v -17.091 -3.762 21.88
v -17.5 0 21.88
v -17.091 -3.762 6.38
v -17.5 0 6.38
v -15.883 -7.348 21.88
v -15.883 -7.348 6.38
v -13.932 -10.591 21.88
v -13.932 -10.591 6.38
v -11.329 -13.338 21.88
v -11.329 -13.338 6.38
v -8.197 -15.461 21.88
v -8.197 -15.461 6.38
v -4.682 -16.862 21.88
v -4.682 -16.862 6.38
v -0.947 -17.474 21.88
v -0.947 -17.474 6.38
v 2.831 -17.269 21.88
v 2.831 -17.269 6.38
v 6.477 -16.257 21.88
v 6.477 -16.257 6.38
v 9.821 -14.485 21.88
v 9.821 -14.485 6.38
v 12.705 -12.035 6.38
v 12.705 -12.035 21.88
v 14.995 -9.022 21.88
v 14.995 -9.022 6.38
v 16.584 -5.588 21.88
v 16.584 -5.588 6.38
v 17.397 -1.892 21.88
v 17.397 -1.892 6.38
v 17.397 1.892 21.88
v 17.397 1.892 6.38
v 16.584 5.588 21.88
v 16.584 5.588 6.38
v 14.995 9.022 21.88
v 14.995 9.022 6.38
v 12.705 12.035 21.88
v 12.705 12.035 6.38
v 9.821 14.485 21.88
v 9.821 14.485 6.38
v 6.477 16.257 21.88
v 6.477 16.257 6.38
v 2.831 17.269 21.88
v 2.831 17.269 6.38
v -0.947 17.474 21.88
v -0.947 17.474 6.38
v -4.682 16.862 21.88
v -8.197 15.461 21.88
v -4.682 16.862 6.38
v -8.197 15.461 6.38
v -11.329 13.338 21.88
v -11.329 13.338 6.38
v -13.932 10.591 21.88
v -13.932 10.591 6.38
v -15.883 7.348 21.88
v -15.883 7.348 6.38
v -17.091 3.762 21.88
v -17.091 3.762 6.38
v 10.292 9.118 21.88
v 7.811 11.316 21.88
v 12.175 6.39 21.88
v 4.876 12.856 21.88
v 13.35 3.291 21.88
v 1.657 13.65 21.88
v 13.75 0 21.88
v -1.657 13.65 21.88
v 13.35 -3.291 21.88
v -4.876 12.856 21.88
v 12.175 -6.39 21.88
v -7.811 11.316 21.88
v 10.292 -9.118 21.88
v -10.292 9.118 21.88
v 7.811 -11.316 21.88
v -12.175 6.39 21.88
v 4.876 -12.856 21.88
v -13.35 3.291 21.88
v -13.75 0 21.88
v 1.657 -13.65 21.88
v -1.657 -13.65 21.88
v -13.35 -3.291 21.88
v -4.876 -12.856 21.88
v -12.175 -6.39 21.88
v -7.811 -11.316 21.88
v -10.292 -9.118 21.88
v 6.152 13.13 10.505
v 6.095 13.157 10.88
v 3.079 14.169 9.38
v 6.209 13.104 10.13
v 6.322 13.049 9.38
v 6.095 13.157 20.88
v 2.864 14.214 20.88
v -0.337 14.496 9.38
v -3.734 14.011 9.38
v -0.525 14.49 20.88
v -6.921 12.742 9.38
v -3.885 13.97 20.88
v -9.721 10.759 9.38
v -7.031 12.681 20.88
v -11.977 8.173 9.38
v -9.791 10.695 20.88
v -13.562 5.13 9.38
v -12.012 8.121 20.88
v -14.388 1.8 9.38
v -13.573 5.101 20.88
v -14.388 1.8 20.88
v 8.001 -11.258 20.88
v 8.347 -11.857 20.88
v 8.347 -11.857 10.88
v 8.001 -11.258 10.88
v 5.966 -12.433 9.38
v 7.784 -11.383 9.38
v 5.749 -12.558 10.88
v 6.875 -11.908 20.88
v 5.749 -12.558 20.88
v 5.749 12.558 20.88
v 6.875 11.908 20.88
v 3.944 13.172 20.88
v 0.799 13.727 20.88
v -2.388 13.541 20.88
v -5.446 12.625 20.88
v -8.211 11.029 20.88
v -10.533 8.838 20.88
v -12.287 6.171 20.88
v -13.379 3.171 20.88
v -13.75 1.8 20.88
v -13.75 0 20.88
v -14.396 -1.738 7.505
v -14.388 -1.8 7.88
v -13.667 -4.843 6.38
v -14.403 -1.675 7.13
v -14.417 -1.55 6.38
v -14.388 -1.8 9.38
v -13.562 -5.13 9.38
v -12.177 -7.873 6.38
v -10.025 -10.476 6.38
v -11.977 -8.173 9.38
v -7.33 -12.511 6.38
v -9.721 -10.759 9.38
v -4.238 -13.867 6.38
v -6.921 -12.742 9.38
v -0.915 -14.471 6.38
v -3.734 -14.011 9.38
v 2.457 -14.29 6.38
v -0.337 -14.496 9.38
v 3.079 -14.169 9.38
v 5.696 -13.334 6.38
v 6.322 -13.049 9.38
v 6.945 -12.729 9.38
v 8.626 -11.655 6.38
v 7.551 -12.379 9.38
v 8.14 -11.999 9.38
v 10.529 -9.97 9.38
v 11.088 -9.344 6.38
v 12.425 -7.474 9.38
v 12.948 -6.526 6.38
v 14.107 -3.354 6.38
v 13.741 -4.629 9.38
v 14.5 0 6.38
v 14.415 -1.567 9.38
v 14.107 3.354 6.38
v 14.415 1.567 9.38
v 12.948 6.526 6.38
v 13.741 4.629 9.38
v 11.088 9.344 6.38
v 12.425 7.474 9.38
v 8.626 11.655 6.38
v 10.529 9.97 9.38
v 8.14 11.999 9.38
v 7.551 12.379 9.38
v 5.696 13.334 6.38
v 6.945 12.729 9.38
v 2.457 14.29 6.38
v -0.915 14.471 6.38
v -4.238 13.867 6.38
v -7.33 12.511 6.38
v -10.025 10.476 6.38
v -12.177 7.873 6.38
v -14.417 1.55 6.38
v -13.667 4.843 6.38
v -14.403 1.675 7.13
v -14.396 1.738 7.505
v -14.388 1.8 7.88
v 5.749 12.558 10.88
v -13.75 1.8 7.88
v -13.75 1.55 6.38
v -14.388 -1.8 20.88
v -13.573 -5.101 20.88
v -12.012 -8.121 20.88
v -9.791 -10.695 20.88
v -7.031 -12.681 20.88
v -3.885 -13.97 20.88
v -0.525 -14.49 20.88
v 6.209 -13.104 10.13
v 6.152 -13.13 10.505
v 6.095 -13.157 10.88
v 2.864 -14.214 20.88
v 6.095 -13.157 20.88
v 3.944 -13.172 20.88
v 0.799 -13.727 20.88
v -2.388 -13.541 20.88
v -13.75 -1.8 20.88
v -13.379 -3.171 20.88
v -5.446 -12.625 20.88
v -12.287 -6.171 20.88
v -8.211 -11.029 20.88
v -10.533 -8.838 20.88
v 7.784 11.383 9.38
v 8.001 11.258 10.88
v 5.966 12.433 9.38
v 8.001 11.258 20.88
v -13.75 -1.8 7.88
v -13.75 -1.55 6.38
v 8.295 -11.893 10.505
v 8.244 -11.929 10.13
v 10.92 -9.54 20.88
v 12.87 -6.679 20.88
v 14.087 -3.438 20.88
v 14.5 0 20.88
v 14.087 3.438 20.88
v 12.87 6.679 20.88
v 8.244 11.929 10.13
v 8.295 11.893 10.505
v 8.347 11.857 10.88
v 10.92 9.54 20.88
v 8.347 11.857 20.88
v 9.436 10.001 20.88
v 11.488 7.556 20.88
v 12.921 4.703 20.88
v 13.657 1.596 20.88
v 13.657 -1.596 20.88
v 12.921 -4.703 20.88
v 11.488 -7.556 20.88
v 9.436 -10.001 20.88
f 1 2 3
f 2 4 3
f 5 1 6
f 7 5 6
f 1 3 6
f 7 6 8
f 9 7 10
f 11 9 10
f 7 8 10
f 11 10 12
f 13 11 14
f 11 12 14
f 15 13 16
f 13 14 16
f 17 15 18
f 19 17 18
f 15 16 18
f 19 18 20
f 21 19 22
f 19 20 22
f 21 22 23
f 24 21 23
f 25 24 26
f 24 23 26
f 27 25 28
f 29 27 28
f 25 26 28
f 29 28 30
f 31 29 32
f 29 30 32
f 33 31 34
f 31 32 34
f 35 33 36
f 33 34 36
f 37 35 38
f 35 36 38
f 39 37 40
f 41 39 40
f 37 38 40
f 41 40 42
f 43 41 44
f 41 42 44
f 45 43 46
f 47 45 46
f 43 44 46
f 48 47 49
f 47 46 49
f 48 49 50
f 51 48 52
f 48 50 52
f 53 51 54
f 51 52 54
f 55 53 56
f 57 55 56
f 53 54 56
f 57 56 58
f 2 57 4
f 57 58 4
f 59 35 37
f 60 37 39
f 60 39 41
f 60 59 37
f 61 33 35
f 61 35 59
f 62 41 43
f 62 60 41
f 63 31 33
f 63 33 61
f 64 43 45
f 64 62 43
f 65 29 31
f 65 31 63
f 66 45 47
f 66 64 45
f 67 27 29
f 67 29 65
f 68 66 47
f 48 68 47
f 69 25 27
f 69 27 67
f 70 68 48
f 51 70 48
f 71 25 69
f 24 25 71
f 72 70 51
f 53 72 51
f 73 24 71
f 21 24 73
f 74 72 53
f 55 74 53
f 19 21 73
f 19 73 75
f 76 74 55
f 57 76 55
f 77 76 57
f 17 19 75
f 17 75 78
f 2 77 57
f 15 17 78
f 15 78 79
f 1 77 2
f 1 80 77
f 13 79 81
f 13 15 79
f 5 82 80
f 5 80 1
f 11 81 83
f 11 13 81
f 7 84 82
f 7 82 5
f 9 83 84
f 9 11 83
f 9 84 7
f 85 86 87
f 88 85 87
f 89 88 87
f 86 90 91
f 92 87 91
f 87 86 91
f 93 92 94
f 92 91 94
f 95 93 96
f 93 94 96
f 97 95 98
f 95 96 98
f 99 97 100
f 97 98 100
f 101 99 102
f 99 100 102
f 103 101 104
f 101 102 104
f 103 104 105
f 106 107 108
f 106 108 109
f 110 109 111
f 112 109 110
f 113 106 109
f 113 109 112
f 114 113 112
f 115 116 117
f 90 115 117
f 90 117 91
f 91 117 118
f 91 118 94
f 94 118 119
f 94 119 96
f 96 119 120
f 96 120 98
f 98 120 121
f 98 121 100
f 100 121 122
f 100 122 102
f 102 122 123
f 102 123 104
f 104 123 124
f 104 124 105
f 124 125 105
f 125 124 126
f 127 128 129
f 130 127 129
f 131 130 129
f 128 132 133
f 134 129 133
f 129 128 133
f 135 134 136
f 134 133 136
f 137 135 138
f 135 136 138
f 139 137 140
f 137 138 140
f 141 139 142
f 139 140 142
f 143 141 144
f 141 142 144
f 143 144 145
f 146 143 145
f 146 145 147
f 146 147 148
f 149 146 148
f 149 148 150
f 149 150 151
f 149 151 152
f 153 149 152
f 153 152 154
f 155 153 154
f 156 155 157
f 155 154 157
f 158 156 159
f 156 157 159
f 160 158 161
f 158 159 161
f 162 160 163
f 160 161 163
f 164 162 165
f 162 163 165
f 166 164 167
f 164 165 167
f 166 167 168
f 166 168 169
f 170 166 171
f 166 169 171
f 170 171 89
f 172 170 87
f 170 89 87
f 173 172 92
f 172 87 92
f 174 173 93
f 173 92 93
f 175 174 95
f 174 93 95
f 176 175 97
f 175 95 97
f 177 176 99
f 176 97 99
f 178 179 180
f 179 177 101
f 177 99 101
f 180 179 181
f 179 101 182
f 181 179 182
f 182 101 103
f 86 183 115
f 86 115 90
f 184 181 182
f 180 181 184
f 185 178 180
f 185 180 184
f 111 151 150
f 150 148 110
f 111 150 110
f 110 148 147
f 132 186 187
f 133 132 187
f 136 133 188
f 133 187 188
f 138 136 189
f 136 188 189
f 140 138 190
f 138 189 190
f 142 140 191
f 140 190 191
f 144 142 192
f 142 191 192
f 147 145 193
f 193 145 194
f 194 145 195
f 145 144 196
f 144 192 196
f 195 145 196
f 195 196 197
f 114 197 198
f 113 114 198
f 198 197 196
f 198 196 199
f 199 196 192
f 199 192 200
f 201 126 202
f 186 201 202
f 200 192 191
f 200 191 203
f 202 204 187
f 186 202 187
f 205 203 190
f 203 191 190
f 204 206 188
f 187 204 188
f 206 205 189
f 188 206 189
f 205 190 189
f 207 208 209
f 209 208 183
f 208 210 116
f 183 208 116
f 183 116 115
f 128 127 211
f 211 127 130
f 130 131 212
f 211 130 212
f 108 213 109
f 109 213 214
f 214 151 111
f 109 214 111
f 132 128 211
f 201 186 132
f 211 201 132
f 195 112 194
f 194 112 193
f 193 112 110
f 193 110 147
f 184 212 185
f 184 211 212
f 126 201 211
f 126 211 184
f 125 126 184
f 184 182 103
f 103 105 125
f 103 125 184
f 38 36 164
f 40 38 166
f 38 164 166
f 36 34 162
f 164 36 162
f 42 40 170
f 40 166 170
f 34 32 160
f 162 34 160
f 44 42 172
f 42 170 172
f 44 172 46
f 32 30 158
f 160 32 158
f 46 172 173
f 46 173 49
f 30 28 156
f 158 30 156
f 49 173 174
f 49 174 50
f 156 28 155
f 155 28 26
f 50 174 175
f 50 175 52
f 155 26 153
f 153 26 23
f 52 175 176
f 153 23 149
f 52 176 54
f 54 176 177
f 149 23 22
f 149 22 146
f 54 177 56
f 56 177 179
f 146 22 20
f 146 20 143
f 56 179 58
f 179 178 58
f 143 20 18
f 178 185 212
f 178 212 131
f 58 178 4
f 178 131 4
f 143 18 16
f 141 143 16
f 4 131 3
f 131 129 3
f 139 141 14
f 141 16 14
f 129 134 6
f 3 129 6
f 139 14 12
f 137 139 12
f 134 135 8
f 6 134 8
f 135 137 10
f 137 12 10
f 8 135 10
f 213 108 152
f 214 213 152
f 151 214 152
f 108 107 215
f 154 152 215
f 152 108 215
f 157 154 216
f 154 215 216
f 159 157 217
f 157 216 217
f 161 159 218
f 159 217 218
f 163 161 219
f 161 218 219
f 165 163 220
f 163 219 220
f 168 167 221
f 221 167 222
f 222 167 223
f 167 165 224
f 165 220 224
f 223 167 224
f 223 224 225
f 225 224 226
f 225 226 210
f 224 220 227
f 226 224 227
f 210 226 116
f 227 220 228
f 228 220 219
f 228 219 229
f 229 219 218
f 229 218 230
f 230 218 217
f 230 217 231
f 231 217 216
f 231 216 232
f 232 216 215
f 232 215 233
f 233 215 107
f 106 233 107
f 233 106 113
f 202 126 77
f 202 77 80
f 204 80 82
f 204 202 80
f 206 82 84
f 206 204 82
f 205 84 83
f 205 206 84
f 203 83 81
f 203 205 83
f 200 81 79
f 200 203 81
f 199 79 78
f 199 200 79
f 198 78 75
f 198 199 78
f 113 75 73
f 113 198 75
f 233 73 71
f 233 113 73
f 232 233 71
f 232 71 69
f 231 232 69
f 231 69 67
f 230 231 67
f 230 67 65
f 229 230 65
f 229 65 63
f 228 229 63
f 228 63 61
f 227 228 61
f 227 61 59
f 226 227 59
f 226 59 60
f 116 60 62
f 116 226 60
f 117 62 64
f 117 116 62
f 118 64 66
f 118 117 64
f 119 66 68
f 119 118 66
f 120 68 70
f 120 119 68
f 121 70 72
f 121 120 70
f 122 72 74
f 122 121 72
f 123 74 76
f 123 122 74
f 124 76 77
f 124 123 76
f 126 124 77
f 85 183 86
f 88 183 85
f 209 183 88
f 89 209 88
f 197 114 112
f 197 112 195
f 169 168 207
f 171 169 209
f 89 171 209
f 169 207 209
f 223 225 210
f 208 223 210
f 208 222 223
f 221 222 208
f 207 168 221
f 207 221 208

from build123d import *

# Parameters (mm, degrees)
SKETCH009_R             = 17.5
PAD008_DEPTH            = 11.5
CHAMFER_1_SIZE2         = 0.25
CHAMFER_1_SIZE          = 1.5
CHAMFER_2_SIZE2         = 0.25
CHAMFER_2_SIZE          = 1.5
CHAMFER_3_SIZE2         = 0.25
CHAMFER_3_SIZE          = 1.5
CHAMFER_4_SIZE2         = 0.25
CHAMFER_4_SIZE          = 1.5
SKETCH016_R             = 17.5
PAD012_DEPTH            = 3
CHAMFER003_1_SIZE2      = 0.25
CHAMFER003_1_SIZE       = 1.5
CHAMFER003_2_SIZE2      = 0.25
CHAMFER003_2_SIZE       = 1.5
SKETCH017_R             = 17.5
SKETCH017_R_2           = 13.75
PAD013_DEPTH            = 1
BODY001_PLACEMENT_ANGLE = 180


with BuildPart() as part:
    # Sketch009 → Pad008 (new body)
    with BuildSketch(Plane.XY.offset(20.75)):
        Circle(SKETCH009_R)
        with BuildLine():
            Line((-8.346636, 11.856798), (-8.000833, 11.257849))
            Line((-8.000833, 11.257849), (-5.749167, 12.557849))
            Line((-5.749167, 12.557849), (-6.09497, 13.156798))
            ThreePointArc((14.387842, 1.8), (7.031155, 12.681201), (-6.09497, 13.156798))
            Line((14.387842, 1.8), (13.75, 1.8))
            Line((13.75, 1.8), (13.75, -1.8))
            Line((14.387842, -1.8), (13.75, -1.8))
            ThreePointArc((-6.09497, -13.156798), (7.031155, -12.681201), (14.387842, -1.8))
            Line((-5.749167, -12.557849), (-6.09497, -13.156798))
            Line((-8.000833, -11.257849), (-5.749167, -12.557849))
            Line((-8.346636, -11.856798), (-8.000833, -11.257849))
            ThreePointArc((-8.346636, 11.856798), (-14.5, 0), (-8.346636, -11.856798))
        make_face(mode=Mode.SUBTRACT)
    extrude(amount=-PAD008_DEPTH)

    # Chamfer 1
    chamfer_1_edges = [part.edges().sort_by_distance(p)[0] for p in [
        (-8.173735, -11.557324, 9.25),
    ]]
    chamfer_1_side = part.faces().sort_by_distance((-8.173735, -11.557324, 15))[0]
    chamfer(chamfer_1_edges, length=CHAMFER_1_SIZE, length2=CHAMFER_1_SIZE2, reference=chamfer_1_side)

    # Chamfer 2
    chamfer_2_edges = [part.edges().sort_by_distance(p)[0] for p in [
        (-5.922069, -12.857324, 9.25),
    ]]
    chamfer_2_side = part.faces().sort_by_distance((-5.922069, -12.857324, 15))[0]
    chamfer(chamfer_2_edges, length=CHAMFER_2_SIZE, length2=CHAMFER_2_SIZE2, reference=chamfer_2_side)

    # Chamfer 3
    chamfer_3_edges = [part.edges().sort_by_distance(p)[0] for p in [
        (-8.173735, 11.557324, 9.25),
    ]]
    chamfer_3_side = part.faces().sort_by_distance((-8.173735, 11.557324, 15))[0]
    chamfer(chamfer_3_edges, length=CHAMFER_3_SIZE, length2=CHAMFER_3_SIZE2, reference=chamfer_3_side)

    # Chamfer 4
    chamfer_4_edges = [part.edges().sort_by_distance(p)[0] for p in [
        (-5.922069, 12.857324, 9.25),
    ]]
    chamfer_4_side = part.faces().sort_by_distance((-5.922069, 12.857324, 15))[0]
    chamfer(chamfer_4_edges, length=CHAMFER_4_SIZE, length2=CHAMFER_4_SIZE2, reference=chamfer_4_side)

    # Sketch016 → Pad012 (join)
    with BuildSketch(Plane.XY.offset(9.25)):
        Circle(SKETCH016_R)
        with BuildLine():
            Line((14.387842, 1.8), (13.75, 1.8))
            Line((13.75, 1.8), (13.75, -1.8))
            Line((14.387842, -1.8), (13.75, -1.8))
            ThreePointArc((14.387842, 1.8), (-14.5, 0), (14.387842, -1.8))
        make_face(mode=Mode.SUBTRACT)
    extrude(amount=-PAD012_DEPTH)

    # Chamfer003 1
    chamfer003_1_edges = [part.edges().sort_by_distance(p)[0] for p in [
        (14.068921, -1.8, 6.25),
    ]]
    chamfer003_1_side = part.faces().sort_by_distance((14.068921, -1.8, 7.75))[0]
    chamfer(chamfer003_1_edges, length=CHAMFER003_1_SIZE, length2=CHAMFER003_1_SIZE2, reference=chamfer003_1_side)

    # Chamfer003 2
    chamfer003_2_edges = [part.edges().sort_by_distance(p)[0] for p in [
        (14.068921, 1.8, 6.25),
    ]]
    chamfer003_2_side = part.faces().sort_by_distance((14.068921, 1.8, 7.75))[0]
    chamfer(chamfer003_2_edges, length=CHAMFER003_2_SIZE, length2=CHAMFER003_2_SIZE2, reference=chamfer003_2_side)

    # Sketch017 → Pad013 (join)
    with BuildSketch(Plane.XY.offset(20.75)):
        Circle(SKETCH017_R)
        Circle(SKETCH017_R_2, mode=Mode.SUBTRACT)
    extrude(amount=PAD013_DEPTH)


with BuildPart() as part_1:
    # Body001 placement: moved
    add(part.part.moved(Location((0, 0, 0.13))).rotate(Axis((0, 0, 0.13), (0, 0, 1)), BODY001_PLACEMENT_ANGLE))


solid = part_1.part
